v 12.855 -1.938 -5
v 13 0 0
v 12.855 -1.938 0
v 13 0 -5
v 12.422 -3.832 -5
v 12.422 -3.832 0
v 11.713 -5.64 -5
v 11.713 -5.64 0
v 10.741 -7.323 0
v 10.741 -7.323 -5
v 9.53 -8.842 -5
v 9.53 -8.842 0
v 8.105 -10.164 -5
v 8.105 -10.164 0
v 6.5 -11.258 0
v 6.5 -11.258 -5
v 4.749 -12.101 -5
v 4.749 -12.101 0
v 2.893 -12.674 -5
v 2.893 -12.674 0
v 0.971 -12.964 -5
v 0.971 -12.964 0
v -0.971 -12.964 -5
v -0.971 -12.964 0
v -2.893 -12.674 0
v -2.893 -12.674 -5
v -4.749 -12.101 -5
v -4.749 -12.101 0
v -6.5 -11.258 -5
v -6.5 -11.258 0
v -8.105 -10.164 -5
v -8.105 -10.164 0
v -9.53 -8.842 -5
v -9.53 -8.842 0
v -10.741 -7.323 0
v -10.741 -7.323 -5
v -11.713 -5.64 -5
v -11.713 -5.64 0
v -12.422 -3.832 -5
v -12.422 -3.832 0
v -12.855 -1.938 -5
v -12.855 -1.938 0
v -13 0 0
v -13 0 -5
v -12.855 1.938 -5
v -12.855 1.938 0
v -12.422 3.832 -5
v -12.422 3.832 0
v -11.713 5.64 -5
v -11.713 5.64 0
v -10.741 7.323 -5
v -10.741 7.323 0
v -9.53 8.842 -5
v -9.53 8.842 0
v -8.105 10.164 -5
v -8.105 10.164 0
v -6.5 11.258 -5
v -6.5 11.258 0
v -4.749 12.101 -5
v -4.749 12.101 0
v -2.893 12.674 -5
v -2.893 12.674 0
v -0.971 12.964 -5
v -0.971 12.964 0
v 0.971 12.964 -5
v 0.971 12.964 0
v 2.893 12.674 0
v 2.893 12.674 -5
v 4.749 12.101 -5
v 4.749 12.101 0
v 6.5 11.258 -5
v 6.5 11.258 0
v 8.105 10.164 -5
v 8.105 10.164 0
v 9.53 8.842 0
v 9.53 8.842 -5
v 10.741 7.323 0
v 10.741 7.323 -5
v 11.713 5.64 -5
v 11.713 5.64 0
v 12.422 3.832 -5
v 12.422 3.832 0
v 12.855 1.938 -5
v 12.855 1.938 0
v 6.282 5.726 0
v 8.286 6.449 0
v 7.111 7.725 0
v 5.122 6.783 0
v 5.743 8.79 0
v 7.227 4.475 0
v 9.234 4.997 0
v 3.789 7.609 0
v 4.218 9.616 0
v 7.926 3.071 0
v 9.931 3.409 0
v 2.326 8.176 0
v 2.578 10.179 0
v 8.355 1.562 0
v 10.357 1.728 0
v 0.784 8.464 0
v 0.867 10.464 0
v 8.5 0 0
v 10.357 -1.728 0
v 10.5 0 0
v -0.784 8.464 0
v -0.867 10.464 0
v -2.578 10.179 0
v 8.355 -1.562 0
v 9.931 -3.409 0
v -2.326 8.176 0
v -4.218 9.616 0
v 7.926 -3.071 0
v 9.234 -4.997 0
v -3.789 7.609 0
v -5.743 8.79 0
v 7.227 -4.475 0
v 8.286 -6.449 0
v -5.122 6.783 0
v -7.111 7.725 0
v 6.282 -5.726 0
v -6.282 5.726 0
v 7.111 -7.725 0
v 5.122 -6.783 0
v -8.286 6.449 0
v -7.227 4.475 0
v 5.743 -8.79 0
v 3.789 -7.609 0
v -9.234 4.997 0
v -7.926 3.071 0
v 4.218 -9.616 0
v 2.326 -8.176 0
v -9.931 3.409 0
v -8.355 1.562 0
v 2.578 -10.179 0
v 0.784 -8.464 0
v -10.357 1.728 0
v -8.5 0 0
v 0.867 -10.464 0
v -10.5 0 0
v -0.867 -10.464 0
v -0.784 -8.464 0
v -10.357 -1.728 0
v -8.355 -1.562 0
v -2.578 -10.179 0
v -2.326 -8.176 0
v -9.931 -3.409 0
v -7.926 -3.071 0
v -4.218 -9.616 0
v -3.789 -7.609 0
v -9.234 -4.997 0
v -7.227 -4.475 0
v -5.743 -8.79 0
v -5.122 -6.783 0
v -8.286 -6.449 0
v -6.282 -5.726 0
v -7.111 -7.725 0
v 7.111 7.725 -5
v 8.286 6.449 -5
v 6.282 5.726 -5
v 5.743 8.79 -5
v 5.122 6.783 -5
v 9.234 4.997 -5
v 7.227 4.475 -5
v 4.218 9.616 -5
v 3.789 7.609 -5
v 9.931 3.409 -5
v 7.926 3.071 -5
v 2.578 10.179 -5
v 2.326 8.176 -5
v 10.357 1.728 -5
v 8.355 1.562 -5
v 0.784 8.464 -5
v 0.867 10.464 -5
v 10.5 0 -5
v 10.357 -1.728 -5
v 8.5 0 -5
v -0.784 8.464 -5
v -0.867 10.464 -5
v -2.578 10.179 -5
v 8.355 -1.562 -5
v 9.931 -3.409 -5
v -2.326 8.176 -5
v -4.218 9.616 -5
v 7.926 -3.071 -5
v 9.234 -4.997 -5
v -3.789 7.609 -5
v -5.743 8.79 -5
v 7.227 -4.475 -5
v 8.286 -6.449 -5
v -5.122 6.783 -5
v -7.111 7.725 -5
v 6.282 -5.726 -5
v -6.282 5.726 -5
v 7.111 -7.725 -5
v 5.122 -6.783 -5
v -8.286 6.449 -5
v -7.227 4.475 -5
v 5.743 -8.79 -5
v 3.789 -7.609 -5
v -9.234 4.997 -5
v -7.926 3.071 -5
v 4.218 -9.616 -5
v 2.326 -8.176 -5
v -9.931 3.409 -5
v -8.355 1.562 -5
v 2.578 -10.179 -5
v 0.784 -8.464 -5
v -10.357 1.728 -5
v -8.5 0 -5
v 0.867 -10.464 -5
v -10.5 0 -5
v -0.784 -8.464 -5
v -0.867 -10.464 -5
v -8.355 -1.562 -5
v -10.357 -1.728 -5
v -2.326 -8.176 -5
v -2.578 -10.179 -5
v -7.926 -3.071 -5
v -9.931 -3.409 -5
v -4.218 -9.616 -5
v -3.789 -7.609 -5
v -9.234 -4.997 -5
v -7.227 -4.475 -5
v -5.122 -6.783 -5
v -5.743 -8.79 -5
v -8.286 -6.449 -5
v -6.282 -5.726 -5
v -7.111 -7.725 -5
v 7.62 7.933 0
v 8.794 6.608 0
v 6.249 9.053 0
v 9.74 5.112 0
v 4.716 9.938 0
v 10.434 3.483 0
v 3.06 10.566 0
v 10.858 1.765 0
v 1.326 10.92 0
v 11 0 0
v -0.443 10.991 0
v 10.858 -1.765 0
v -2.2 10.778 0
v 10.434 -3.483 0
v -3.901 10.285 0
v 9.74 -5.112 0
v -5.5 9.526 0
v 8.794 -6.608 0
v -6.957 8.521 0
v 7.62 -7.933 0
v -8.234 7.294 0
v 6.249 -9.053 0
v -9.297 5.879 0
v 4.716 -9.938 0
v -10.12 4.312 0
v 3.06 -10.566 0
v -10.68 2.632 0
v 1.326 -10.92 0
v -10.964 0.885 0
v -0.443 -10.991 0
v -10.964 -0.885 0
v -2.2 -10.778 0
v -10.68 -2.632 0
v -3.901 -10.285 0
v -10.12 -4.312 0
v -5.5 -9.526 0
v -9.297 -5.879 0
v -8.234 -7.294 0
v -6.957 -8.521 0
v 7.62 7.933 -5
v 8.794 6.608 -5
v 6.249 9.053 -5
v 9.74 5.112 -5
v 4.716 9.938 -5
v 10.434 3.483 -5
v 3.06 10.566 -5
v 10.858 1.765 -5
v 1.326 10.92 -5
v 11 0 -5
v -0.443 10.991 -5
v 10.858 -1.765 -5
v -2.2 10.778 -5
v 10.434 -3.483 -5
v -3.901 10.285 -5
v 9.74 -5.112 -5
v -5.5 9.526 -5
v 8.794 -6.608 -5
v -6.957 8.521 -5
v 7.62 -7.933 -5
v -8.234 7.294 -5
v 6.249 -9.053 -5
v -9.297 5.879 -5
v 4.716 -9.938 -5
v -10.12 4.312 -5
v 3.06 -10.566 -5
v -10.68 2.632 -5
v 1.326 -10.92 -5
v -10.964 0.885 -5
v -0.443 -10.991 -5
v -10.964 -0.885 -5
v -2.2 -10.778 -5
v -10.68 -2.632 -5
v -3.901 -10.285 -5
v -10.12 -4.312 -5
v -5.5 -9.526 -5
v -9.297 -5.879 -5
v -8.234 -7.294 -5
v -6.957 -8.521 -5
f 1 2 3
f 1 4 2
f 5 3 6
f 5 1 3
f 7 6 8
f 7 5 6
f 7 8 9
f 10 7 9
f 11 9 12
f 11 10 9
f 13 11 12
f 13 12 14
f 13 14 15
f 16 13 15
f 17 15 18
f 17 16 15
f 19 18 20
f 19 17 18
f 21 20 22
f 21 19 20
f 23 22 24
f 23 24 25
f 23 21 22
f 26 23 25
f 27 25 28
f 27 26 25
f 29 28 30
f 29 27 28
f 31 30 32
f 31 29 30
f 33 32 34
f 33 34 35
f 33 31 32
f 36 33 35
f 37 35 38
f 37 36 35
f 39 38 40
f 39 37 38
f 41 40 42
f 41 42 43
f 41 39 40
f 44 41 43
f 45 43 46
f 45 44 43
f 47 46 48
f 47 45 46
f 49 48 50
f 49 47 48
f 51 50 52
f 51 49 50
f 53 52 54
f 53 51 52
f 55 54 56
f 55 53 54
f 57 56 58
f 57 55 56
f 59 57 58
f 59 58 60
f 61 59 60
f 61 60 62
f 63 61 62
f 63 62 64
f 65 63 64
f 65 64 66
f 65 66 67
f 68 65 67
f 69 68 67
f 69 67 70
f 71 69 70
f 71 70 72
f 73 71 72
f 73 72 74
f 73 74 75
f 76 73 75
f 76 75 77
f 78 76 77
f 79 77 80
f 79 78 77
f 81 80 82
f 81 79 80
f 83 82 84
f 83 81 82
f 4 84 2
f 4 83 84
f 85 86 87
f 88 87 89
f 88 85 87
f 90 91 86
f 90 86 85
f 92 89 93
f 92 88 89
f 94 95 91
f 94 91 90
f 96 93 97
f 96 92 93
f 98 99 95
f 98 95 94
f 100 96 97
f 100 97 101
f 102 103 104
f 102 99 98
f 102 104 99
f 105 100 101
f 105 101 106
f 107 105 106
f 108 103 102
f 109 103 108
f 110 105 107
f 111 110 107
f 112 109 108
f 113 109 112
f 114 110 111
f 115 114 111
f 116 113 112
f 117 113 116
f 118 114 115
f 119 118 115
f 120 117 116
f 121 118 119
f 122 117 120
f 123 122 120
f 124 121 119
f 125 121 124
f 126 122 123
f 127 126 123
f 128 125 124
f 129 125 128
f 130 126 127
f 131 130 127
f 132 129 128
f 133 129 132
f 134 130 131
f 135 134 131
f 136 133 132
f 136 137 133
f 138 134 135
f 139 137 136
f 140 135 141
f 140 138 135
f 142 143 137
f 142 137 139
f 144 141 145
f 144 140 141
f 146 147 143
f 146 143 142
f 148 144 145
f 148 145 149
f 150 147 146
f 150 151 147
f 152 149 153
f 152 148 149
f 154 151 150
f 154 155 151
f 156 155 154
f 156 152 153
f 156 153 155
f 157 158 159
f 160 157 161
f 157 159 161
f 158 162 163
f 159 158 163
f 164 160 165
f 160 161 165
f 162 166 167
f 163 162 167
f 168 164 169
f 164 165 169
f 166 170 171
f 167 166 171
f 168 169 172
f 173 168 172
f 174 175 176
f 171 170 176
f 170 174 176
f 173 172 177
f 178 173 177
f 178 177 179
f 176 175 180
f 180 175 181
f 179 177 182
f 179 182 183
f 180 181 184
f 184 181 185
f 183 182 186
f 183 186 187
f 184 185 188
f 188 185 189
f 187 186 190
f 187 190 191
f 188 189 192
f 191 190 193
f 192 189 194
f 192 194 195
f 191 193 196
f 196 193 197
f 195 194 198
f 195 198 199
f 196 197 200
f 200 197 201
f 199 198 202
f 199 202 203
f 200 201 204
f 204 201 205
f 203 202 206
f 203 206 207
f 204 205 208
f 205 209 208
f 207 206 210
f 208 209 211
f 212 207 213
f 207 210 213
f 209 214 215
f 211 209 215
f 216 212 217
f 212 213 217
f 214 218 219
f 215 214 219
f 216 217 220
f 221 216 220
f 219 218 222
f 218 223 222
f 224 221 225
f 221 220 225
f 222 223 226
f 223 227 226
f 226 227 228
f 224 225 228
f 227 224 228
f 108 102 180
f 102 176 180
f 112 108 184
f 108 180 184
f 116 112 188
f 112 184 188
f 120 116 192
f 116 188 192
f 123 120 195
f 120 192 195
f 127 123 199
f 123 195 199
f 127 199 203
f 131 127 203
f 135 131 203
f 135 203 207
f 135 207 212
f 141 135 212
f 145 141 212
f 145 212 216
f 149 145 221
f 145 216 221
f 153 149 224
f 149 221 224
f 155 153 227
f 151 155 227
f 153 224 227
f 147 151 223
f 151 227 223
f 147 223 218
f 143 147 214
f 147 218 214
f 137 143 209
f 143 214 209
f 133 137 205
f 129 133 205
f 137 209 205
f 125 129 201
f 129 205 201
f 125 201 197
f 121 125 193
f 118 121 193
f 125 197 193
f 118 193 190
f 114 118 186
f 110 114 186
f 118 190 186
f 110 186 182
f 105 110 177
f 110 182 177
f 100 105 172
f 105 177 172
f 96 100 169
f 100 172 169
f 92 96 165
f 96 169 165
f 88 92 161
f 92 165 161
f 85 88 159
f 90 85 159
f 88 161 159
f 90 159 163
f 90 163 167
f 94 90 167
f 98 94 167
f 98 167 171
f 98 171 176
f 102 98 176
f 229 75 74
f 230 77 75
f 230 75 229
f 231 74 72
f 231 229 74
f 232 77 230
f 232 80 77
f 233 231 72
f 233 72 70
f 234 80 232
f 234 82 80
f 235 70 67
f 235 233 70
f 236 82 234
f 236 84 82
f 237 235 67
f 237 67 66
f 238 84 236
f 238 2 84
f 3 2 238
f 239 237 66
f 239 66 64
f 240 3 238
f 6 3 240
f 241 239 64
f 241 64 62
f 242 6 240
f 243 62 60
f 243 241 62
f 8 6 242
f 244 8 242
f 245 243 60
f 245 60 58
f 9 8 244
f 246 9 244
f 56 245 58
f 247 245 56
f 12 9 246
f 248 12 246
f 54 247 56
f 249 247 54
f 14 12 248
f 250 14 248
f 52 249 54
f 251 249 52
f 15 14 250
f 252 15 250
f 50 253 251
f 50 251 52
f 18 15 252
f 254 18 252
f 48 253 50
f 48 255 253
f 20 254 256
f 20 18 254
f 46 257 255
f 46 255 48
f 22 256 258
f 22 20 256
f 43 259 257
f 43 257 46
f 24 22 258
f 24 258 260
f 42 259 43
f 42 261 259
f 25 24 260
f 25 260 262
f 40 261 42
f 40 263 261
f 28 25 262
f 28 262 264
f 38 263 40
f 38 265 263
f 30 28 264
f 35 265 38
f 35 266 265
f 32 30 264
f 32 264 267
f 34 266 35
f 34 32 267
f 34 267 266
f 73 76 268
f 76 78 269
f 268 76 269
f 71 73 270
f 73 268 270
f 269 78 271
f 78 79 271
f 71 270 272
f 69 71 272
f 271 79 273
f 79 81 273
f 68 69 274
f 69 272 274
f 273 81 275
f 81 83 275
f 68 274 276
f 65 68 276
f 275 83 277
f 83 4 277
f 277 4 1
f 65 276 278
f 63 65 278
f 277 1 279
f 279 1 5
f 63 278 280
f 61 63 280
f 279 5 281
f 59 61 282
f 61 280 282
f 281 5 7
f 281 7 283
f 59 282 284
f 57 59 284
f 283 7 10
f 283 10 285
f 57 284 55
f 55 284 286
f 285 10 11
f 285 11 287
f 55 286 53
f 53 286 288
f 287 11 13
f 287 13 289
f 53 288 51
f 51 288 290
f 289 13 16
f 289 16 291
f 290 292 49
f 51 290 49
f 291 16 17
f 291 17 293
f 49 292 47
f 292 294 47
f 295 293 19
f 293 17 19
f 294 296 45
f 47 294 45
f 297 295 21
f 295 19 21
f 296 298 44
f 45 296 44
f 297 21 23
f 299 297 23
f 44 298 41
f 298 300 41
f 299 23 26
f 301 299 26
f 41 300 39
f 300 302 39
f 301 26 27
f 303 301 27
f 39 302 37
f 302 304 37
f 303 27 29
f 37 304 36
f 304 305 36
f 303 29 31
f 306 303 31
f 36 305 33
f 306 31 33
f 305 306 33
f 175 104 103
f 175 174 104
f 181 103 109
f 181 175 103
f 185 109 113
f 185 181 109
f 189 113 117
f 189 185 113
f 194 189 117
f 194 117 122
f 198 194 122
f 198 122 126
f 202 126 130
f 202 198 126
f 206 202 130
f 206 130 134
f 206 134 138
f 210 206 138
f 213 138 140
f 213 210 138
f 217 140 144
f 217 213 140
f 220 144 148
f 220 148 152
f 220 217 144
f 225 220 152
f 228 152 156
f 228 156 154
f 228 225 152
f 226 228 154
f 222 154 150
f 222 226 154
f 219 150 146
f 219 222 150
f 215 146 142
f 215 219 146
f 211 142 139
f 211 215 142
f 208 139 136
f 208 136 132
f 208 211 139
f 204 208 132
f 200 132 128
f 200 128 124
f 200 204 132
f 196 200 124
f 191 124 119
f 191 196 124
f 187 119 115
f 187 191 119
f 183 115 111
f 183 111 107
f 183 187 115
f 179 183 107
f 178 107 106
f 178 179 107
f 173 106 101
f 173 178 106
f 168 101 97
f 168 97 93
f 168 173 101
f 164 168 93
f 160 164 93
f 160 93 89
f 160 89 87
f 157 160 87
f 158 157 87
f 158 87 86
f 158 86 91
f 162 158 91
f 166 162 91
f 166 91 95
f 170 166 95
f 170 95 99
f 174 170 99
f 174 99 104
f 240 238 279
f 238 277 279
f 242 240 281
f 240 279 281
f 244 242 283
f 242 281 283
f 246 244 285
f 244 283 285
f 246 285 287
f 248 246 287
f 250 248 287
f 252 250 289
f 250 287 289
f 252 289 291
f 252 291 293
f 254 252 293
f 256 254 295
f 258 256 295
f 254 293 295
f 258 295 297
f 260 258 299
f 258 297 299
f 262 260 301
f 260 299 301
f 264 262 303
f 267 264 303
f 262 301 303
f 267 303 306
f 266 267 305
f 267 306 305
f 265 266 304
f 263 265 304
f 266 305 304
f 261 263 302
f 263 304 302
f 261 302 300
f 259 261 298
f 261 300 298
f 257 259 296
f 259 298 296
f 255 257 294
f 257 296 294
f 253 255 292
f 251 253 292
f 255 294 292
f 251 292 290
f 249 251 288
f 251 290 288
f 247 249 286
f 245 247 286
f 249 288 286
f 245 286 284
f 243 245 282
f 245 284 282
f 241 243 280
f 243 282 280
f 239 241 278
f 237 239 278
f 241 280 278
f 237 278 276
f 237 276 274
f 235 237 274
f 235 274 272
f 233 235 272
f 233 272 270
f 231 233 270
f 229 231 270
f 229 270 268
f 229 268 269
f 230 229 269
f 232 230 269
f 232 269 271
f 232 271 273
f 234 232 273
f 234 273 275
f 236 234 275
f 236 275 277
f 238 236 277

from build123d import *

# Parameters (mm, degrees)
ESQUISSE1_W = 2
ESQUISSE1_H = 5


with BuildPart() as part:
    # Esquisse1 → Révolution1 (revolve)
    with BuildSketch(Plane(origin=(0, 0, 0), x_dir=(1, 0, 0), z_dir=(0, 1, 0))):
        with Locations((9.5, 2.5)):
            Rectangle(ESQUISSE1_W, ESQUISSE1_H)
        with Locations((12, 2.5)):
            Rectangle(ESQUISSE1_W, ESQUISSE1_H)
    revolve(axis=Axis((0, 0, 6.622286364), (0, 0, -1)))


solid = part.part
